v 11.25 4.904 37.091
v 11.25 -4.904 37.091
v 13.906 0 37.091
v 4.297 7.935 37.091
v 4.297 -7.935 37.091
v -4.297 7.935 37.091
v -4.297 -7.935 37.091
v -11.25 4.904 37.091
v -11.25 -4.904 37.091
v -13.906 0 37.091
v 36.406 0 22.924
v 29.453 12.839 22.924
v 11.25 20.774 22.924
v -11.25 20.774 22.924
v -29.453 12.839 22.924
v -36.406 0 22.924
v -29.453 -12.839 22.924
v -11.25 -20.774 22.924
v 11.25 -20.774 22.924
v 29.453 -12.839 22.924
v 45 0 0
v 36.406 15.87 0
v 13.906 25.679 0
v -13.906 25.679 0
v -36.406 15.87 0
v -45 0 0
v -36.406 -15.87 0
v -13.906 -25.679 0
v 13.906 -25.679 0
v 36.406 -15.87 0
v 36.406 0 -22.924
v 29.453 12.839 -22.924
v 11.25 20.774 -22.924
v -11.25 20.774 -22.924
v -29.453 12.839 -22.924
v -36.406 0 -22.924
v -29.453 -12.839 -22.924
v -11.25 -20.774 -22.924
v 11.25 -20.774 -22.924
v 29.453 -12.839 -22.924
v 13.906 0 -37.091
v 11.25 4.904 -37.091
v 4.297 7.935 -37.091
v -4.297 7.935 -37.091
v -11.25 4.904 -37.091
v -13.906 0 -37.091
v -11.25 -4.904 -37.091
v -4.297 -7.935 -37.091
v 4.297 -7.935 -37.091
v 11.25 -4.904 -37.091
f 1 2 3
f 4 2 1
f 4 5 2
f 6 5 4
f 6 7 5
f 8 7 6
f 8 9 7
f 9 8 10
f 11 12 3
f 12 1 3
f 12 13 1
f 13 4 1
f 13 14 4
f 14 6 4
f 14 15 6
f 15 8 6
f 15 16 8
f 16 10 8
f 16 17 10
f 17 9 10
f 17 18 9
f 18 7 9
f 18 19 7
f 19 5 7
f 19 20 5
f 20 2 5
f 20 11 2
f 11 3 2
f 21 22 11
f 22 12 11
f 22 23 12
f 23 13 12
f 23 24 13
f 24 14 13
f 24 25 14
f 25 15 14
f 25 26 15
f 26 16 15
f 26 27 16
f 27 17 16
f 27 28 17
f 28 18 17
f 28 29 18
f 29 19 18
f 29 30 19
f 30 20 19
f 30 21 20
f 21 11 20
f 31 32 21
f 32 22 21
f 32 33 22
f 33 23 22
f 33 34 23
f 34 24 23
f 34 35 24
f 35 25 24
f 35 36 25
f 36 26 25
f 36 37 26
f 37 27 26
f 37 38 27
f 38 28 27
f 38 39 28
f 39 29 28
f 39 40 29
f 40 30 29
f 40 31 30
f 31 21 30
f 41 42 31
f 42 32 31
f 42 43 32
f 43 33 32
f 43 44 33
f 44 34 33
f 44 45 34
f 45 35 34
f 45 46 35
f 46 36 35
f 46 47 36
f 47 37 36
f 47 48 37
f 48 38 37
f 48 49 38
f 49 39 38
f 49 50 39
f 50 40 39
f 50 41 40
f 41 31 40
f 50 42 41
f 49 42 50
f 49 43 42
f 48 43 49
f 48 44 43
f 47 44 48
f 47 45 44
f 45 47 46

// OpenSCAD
// Generated by SolidPython 1.0.1 on 2020-07-29 00:46:52


scale(v = [15, 9, 13]) {
	sphere(r = 3);
}
/***********************************************
*********      SolidPython code:      **********
************************************************
 
# import packages: SolidPython
from solid import *
from solid.utils import *
from itertools import chain, combinations, permutations


class Resize:

    def __init__(self, scad_file):
        self.scad_file = scad_file
        #self.scad_file = import_scad(scad_file)
        # cone/cylinder param:
        self.r1 = 0
        self.r2 = 0
        self.h = 0
        # rectangular prism param:
        self.w = 0
        self.l = 0
        # ellipse param:
        self.r = 0

    # import OpenScad code (file name corresponds to shape)


    # classify shape + parameters
    def assign(self, param1, param2, param3):
        if self.scad_file == 'cone.scad':
            self.r1 = param1
            self.r2 = param2
            self.h = param3
        elif self.scad_file == 'cylinder.scad':
            self.r1 = param1
            self.r2 = param2
            self.h = param3
        elif self.scad_file == 'rectangularPrism.scad':
            self.h = param1
            self.l = param2
            self.w = param3
        else:
            self.r = param1
            self.h = param2

    # resize parameters
    def iterate(self):
        x = range(3, 20, 2)
        i = 1
        if self.scad_file == 'cone.scad':
            tempList = list(permutations(x, 2))
            for temp in tempList:
                param1 = temp[0]
                param2 = temp[1]
                filepath = 'produced_scad_files/' + 'cone' + str(param1) + '_' + str(param2) + '_' + '.scad'
                scad_render_to_file(cylinder(h=param1, r1=param2, r2=0), filepath)

        elif self.scad_file == 'cylinder.scad':
            tempList = list(permutations(x, 3))
            for temp in tempList:
                param1 = temp[0]
                param2 = temp[1]
                filepath = 'produced_scad_files/' + 'cylinder' + str(param1) + '_' + str(param2) + '_' + '.scad'
                scad_render_to_file(cylinder(h=param1, r1=param2, r2=param2), filepath)

        elif self.scad_file == 'rectangularPrism.scad':
            tempList = list(permutations(x, 3))
            for temp in tempList:
                param1 = temp[0]
                param2 = temp[1]
                param3 = temp[2]
                filepath = 'produced_scad_files/' + 'rectangularPrism' + str(param1) + '_' + str(param2) + '_' + str(
                    param3) + '.scad'
                scad_render_to_file(cube(size=(param1, param2, param3)), filepath)

        elif self.scad_file == 'ellipse.scad':
            tempList = list(permutations(x, 4))
            for temp in tempList:
                param1 = temp[0]
                param2 = temp[1]
                param3 = temp[2]
                param4 = temp[3]
                filepath = 'produced_scad_files/' + 'ellipse' + str(param1) + '_' + str(param2) + '_' + str(param3) + '_' + str(param4) + '.scad'
                scad_render_to_file(scale([param1, param2, param3])(sphere(r=param4)), filepath)

    def render_to_scadfile(self):
        scad_render_to_file(scad, 'example.scad') 
 
************************************************/
